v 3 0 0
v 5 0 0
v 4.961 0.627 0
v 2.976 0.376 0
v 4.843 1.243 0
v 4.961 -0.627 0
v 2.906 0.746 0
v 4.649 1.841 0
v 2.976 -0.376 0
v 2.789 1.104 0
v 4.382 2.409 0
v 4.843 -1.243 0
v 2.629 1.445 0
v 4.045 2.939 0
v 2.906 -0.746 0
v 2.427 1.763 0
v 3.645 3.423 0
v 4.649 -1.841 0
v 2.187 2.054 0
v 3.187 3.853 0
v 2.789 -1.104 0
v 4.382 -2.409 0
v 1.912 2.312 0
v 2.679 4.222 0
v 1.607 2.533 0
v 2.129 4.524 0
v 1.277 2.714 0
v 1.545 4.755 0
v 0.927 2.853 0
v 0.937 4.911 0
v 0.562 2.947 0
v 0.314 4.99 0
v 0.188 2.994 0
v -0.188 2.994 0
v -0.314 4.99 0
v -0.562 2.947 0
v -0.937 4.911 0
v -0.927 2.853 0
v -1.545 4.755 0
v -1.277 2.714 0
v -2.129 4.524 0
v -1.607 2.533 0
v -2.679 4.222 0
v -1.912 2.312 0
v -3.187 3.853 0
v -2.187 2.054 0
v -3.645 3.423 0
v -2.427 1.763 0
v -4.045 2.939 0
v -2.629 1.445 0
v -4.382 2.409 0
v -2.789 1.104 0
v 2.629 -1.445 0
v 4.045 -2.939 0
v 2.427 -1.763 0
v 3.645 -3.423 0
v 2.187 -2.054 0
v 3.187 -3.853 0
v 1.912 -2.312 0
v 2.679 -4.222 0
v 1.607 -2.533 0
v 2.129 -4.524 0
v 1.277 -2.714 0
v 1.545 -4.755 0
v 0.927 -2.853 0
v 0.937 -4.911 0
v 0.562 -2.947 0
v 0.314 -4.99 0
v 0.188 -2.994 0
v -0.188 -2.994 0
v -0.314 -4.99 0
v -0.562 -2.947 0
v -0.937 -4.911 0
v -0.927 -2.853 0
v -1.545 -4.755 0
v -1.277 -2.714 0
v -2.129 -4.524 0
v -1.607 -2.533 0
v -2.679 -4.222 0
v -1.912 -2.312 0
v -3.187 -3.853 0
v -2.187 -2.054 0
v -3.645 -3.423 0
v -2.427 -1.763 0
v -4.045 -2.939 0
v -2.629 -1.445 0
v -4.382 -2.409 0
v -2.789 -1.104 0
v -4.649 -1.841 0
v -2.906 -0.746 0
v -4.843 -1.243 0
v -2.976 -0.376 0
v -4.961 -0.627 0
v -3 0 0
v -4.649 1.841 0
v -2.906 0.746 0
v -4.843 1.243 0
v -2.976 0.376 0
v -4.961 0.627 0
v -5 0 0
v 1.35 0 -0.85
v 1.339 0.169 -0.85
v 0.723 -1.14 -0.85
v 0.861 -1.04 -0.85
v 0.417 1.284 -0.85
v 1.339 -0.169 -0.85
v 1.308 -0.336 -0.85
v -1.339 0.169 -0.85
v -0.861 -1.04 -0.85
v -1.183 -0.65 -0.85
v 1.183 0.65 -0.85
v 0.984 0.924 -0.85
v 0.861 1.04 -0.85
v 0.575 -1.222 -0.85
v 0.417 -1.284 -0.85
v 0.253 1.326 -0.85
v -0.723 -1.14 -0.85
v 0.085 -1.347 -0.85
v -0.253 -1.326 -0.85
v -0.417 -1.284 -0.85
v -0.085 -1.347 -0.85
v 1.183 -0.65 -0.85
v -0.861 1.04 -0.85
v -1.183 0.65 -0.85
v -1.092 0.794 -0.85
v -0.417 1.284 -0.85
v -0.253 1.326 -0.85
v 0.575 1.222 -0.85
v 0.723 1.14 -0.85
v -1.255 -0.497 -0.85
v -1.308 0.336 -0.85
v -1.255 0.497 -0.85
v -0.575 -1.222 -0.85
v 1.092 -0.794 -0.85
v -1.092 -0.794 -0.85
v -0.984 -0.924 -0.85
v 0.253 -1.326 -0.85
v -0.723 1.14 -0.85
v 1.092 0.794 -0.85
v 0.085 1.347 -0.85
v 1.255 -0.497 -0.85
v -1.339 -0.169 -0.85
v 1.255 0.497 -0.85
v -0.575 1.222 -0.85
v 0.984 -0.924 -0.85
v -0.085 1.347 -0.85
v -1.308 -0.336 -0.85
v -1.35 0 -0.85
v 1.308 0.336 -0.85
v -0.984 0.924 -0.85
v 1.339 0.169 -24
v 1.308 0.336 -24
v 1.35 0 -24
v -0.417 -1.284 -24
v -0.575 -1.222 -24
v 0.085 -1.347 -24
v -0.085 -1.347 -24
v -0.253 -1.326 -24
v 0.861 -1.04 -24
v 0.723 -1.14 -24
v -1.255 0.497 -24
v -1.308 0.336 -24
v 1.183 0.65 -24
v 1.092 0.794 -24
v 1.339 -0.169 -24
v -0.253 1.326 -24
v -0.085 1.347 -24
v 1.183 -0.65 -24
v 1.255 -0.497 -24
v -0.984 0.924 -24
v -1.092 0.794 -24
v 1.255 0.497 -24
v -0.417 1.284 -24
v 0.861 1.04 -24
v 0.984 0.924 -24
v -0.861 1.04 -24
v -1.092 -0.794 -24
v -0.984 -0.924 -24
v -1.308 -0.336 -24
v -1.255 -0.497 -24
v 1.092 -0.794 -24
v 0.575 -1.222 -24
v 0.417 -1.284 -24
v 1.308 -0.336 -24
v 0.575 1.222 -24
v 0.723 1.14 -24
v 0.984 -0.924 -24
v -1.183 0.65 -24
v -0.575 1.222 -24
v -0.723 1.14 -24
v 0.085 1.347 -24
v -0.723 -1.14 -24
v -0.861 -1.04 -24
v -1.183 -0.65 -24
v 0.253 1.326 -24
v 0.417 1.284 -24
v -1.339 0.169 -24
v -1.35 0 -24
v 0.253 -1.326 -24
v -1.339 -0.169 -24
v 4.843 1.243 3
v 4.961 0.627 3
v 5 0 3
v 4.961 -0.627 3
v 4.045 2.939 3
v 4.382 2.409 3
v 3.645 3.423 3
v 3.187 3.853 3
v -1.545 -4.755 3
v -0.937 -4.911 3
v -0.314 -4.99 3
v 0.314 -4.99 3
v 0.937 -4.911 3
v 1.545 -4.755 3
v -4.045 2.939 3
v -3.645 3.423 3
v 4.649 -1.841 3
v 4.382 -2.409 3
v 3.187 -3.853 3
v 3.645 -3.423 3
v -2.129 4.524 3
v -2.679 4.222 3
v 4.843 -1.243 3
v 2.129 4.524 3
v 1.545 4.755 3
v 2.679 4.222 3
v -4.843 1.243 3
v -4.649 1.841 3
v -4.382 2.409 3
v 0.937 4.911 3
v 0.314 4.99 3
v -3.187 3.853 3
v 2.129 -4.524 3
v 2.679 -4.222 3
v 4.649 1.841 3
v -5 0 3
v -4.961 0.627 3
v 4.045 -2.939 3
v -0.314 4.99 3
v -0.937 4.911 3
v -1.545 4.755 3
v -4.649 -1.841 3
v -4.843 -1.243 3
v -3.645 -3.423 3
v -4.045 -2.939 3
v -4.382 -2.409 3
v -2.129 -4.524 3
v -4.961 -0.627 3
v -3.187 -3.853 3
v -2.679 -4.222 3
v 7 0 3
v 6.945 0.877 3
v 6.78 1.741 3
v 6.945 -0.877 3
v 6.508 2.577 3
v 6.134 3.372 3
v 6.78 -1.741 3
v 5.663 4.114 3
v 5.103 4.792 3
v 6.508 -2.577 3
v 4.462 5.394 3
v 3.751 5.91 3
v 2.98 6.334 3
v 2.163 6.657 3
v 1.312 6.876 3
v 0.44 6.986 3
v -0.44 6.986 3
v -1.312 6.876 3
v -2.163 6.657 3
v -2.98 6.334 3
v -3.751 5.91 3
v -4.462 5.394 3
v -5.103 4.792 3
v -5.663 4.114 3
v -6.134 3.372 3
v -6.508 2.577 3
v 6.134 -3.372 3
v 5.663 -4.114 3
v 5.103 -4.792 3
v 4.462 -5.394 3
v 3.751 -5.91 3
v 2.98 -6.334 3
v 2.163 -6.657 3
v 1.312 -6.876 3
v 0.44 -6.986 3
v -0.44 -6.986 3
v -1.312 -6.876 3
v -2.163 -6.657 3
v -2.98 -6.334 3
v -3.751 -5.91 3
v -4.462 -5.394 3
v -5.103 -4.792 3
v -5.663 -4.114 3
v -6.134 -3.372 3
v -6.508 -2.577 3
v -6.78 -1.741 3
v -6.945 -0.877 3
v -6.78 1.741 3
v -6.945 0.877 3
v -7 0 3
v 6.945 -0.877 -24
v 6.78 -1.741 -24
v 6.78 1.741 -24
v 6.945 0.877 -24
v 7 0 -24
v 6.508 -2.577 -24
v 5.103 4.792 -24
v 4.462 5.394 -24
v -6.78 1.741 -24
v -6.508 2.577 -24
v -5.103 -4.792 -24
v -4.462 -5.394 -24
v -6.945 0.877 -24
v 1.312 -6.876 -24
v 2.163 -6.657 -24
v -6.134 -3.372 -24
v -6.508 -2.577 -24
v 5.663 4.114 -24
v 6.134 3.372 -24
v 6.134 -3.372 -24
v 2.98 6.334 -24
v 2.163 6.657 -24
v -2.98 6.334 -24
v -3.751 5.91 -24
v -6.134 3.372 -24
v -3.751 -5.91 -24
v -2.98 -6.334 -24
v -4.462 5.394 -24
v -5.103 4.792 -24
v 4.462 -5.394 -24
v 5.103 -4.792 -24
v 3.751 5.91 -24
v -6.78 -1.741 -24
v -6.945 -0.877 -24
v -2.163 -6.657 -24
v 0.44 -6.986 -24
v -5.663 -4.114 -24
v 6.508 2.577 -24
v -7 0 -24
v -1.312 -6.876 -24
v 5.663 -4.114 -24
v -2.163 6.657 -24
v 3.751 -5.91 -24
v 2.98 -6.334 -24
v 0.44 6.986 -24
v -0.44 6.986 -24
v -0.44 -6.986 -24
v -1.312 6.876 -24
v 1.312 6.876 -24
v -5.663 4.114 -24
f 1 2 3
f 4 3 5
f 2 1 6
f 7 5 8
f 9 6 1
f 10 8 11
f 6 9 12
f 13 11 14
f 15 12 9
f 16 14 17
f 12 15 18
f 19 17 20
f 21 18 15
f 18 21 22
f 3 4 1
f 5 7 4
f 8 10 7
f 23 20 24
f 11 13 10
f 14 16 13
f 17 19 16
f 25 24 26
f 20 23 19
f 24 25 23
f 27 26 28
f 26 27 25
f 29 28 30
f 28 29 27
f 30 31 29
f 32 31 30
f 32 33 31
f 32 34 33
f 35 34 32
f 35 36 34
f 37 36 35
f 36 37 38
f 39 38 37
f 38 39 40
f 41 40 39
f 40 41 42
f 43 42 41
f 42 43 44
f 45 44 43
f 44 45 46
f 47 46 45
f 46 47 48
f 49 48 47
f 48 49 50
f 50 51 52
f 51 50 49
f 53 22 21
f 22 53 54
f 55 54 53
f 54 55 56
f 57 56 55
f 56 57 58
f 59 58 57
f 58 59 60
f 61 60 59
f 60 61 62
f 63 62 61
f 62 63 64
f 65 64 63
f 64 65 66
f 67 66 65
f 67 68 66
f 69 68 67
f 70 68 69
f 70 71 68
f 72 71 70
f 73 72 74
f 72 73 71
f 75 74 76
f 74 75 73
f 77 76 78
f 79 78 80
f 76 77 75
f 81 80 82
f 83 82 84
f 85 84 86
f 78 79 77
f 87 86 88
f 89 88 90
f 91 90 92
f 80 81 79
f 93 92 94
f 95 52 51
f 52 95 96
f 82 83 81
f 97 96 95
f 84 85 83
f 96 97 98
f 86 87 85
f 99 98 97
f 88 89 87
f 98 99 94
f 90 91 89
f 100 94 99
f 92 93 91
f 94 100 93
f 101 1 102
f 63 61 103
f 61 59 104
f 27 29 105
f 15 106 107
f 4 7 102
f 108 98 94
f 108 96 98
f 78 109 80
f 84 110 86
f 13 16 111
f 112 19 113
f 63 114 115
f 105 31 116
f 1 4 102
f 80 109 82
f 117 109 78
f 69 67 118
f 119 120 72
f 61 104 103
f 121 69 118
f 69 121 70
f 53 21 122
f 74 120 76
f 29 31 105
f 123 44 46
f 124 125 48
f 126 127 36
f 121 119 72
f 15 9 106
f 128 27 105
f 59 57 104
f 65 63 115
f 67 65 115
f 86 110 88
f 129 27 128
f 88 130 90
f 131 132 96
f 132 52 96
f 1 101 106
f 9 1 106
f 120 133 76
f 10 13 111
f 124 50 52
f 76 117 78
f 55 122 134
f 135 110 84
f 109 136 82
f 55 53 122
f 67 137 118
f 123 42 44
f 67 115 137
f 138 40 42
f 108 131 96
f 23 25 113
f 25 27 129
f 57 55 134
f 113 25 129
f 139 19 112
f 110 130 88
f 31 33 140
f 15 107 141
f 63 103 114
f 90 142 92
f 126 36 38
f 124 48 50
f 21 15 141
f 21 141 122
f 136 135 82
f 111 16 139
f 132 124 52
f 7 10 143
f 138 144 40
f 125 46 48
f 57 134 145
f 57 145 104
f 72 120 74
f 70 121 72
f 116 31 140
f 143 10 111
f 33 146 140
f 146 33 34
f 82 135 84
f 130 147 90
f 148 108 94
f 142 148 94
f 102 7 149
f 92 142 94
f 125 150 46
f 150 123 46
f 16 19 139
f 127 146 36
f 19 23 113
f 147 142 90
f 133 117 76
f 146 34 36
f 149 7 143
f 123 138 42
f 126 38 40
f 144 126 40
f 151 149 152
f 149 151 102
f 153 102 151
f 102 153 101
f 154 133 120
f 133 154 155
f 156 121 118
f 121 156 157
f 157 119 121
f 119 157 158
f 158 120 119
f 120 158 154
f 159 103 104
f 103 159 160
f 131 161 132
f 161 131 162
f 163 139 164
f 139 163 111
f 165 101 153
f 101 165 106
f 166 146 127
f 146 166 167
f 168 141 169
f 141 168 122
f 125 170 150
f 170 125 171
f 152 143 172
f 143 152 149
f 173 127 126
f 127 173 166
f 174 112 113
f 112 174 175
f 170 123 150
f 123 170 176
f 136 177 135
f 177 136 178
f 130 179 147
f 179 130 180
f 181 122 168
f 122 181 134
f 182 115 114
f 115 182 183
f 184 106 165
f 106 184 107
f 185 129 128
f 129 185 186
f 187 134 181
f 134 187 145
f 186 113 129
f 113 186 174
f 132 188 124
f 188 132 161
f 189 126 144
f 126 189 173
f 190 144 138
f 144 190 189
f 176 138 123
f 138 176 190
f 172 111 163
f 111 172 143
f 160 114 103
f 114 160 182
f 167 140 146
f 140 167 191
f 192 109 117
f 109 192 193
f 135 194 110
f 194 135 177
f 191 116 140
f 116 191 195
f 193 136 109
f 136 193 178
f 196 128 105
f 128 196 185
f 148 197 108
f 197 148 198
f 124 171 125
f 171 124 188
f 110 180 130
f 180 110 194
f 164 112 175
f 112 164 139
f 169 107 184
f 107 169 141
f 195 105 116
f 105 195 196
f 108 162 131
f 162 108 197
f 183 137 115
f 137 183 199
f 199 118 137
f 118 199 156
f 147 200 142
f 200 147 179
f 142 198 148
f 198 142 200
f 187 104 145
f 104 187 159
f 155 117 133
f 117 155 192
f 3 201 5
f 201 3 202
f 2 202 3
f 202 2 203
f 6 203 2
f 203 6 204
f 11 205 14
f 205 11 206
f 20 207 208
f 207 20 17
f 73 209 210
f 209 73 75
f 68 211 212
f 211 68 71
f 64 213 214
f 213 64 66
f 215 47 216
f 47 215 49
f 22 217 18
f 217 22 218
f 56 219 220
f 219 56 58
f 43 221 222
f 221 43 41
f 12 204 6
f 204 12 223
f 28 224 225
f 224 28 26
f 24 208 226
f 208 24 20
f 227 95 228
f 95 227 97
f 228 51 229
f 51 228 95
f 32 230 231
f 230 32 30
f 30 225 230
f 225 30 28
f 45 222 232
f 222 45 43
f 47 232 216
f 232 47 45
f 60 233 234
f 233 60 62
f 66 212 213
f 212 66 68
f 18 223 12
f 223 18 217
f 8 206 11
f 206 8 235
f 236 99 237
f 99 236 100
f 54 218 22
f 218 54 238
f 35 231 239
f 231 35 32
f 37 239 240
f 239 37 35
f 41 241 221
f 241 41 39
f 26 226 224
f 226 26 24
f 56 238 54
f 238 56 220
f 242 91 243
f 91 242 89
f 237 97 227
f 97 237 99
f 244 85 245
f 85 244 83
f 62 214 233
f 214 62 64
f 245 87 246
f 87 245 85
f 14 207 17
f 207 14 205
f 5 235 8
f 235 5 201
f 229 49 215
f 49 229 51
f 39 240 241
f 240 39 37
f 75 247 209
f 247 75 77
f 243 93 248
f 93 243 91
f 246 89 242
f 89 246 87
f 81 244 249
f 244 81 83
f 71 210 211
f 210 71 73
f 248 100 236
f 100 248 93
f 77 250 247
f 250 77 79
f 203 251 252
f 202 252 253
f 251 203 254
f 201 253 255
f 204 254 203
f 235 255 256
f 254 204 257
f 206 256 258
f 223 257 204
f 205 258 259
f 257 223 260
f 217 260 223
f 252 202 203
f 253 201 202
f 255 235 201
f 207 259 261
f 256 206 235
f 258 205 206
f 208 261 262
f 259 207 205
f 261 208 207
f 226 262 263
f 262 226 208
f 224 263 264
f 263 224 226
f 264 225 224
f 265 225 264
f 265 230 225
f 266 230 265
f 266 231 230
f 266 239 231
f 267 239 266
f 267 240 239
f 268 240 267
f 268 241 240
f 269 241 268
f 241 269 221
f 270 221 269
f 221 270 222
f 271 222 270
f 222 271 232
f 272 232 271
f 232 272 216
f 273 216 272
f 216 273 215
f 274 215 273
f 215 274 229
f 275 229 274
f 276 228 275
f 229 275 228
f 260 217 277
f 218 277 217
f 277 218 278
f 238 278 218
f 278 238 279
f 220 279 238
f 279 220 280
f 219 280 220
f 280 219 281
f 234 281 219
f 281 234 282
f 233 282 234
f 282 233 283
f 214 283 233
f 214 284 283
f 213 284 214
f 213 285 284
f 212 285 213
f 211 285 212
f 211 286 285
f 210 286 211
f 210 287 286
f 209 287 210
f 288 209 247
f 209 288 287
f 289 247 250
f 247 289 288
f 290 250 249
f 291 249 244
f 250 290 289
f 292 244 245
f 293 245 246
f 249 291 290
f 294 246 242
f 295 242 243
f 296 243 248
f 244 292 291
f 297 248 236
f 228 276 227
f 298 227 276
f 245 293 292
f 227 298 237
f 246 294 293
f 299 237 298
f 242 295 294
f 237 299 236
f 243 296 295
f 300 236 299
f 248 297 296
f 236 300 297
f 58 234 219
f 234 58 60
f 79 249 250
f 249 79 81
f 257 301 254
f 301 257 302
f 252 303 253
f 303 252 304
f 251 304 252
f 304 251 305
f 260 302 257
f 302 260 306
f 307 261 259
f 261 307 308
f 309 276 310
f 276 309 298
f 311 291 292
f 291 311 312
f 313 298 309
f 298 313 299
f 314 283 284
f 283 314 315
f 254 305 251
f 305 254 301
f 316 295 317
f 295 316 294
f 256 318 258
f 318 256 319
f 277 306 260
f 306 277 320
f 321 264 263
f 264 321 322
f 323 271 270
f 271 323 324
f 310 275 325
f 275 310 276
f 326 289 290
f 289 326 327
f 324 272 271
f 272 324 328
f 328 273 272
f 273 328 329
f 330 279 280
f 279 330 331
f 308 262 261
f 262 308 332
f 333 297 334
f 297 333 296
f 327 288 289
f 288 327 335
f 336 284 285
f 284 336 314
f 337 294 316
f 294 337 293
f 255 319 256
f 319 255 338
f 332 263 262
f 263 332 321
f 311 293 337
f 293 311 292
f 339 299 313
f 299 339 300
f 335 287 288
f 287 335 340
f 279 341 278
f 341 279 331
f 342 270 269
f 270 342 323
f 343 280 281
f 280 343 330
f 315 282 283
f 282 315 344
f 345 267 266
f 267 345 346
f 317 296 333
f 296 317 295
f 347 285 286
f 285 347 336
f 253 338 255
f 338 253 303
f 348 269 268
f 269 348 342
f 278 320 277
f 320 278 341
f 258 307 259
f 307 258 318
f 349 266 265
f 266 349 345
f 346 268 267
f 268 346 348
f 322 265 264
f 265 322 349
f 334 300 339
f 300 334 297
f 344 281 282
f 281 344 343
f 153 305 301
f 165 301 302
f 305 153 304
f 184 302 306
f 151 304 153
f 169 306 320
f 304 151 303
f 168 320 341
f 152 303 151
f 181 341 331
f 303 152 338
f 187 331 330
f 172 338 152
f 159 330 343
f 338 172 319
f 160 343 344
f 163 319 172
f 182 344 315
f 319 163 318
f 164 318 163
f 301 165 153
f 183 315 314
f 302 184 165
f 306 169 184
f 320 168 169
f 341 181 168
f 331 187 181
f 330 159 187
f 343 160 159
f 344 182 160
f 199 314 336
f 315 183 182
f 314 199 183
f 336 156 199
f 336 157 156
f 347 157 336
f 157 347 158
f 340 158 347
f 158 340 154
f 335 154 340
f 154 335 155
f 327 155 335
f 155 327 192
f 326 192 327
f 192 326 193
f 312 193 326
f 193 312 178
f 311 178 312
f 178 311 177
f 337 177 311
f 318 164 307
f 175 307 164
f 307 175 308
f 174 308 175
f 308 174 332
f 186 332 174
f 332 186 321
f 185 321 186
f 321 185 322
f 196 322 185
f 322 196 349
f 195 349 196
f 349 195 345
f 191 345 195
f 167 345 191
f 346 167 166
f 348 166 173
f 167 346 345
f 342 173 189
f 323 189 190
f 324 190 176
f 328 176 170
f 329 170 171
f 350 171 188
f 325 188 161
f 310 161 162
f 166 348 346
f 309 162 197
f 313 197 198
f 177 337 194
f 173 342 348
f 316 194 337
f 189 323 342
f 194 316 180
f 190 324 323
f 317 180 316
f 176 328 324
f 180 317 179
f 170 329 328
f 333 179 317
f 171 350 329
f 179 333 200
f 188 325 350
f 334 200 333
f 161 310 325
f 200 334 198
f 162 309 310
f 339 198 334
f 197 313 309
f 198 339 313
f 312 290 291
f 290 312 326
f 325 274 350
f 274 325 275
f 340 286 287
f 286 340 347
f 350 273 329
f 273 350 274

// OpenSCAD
$fn = 50;

difference() {
	union() {
		translate(v = [0, 0, -24.0]) {
			cylinder(h = 27, r = 7.0);
		}
	}
	union() {
		translate(v = [0, 0, 0]) {
			rotate(a = [0, 0, 0]) {
				difference() {
					union() {
						translate(v = [0, 0, -27.0]) {
							cylinder(h = 27, r = 1.0);
						}
						translate(v = [0, 0, -0.85]) {
							cylinder(h = 0.85, r1 = 1.35, r2 = 3.0);
						}
						translate(v = [0, 0, -27.0]) {
							cylinder(h = 27, r = 1.35);
						}
						translate(v = [0, 0, -27.0]) {
							cylinder(h = 27, r = 1.0);
						}
					}
					union();
				}
			}
		}
		#cylinder(h = 3, r = 5.0);
	}
}
